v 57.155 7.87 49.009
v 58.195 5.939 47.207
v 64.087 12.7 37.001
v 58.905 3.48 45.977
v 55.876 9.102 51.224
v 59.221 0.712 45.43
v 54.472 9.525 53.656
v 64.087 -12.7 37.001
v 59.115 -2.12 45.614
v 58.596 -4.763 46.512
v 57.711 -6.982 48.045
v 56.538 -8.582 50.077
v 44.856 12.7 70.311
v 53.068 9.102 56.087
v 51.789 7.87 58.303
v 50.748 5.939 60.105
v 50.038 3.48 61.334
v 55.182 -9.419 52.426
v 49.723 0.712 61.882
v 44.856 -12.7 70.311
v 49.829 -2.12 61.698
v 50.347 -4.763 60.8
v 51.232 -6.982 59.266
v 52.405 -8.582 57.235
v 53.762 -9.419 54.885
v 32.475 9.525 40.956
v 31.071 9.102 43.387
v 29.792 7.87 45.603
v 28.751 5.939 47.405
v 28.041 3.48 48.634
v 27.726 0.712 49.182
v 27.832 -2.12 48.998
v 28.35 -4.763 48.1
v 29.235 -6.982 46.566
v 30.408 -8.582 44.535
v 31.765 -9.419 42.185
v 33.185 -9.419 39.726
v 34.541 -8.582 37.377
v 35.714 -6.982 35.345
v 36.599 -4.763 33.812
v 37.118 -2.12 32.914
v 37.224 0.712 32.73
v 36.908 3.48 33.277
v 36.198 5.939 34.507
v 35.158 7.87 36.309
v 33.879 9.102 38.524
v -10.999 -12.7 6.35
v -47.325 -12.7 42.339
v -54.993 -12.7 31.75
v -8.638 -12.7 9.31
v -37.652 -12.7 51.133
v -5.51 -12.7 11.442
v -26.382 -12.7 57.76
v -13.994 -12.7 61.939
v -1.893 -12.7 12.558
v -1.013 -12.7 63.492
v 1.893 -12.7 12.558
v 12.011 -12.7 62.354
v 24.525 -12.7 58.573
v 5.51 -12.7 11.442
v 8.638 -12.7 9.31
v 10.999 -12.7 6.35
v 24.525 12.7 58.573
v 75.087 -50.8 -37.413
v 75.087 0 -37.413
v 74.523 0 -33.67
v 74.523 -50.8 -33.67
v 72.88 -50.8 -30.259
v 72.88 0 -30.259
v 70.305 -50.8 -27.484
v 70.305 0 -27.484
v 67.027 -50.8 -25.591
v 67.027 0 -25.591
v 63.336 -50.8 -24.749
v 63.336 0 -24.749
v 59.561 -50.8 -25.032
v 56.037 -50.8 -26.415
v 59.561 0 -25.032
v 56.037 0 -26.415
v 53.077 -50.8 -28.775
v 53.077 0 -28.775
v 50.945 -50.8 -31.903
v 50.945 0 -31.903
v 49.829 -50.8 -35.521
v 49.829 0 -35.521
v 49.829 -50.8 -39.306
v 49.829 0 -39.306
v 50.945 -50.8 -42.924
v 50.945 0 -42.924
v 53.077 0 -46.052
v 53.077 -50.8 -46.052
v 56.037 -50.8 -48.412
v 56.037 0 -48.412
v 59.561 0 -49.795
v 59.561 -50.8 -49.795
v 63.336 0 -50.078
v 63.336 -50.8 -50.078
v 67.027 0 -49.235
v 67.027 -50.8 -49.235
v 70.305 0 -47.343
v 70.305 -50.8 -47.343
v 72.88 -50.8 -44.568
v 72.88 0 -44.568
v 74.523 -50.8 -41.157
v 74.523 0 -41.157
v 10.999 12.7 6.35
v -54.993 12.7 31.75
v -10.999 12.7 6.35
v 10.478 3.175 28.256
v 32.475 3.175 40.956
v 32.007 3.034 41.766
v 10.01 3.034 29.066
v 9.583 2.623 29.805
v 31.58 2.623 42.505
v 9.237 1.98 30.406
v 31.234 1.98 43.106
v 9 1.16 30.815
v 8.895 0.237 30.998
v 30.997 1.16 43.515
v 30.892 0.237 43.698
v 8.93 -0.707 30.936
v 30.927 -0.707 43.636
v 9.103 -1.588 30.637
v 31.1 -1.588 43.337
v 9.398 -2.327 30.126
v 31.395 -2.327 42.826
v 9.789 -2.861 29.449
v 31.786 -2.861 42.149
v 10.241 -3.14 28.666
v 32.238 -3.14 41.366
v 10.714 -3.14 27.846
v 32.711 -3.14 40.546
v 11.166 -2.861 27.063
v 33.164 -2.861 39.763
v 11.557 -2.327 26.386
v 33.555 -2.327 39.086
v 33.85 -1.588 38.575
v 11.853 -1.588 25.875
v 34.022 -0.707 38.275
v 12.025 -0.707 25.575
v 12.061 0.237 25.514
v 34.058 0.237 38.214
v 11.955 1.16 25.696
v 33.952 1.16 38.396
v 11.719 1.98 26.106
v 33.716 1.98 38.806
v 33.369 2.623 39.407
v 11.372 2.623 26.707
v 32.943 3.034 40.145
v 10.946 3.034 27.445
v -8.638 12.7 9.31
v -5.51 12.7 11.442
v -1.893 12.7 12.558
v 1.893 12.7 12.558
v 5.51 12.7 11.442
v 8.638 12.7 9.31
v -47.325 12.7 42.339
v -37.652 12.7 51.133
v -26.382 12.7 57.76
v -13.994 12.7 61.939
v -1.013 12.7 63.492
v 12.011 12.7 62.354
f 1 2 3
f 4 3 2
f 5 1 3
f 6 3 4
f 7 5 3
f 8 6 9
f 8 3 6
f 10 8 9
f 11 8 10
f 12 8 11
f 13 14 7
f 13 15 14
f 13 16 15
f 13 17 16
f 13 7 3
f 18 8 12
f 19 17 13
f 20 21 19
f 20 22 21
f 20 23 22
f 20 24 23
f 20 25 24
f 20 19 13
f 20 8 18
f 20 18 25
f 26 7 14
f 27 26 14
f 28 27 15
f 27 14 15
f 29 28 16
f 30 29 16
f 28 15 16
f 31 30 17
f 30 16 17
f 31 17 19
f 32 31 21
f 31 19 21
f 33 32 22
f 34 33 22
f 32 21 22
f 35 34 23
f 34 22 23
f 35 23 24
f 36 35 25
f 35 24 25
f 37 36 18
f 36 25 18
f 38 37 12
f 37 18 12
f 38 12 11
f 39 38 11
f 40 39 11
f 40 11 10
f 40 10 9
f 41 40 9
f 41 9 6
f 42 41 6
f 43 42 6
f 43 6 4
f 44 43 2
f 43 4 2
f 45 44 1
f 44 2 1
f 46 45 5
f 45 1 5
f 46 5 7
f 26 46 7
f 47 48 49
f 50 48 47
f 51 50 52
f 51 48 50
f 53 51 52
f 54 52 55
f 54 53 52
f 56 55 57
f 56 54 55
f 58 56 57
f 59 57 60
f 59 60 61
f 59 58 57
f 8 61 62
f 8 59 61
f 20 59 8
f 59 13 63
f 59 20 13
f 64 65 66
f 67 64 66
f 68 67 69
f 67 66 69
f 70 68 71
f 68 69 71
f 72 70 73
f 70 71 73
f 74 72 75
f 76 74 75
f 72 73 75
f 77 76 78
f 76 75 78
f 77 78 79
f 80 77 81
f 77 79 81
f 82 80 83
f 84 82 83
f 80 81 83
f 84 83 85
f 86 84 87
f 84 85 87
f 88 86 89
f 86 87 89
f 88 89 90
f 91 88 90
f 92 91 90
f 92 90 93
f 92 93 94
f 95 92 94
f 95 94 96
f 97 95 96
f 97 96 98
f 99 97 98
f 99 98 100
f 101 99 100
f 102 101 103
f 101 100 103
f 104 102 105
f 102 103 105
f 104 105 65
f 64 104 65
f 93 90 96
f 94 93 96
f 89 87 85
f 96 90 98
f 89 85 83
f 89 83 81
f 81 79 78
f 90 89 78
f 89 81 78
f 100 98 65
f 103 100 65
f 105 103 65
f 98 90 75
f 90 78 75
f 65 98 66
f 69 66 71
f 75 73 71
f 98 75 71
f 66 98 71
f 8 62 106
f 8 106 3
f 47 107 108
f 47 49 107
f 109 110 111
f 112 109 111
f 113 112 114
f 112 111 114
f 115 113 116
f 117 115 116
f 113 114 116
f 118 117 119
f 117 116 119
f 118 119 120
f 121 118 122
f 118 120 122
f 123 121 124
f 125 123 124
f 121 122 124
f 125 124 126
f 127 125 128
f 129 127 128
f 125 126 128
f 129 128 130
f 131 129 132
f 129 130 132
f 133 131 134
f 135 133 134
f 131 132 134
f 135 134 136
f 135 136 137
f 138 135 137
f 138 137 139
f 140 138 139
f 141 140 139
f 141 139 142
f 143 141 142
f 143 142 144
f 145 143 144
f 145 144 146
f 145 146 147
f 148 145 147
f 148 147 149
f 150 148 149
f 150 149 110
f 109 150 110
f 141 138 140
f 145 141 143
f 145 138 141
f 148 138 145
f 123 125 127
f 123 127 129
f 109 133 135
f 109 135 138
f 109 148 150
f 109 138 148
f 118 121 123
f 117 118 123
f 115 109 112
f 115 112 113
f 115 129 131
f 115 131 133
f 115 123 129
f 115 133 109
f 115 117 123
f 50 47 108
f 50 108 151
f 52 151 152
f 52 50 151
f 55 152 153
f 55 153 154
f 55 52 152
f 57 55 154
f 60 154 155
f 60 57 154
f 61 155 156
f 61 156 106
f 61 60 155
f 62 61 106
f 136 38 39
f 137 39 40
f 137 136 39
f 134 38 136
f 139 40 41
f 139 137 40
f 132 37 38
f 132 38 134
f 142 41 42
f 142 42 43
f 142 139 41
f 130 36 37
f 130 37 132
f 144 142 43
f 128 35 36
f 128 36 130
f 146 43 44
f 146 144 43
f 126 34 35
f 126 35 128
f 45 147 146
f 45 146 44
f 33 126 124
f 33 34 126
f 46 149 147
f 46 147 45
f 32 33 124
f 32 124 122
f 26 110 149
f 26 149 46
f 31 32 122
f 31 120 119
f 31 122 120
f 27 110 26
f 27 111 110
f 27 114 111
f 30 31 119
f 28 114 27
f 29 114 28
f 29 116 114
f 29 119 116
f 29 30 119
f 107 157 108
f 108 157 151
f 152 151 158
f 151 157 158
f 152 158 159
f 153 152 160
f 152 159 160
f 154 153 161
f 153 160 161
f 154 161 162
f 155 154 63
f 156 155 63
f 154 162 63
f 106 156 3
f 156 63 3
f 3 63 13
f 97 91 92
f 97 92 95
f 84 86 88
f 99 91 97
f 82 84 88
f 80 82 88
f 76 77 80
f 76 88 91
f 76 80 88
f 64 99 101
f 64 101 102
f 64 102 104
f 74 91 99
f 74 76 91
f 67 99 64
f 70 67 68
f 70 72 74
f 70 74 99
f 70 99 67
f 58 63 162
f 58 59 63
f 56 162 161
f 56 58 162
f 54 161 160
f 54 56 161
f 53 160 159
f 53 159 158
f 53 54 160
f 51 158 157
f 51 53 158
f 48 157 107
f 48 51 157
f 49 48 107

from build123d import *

# Parameters (mm, degrees)
F1_DEPTH = 12.7
F2_R     = 3.175
F3_DEPTH = 50.8
F2_R_2   = 9.525
F4_DEPTH = 25.4
F5_R     = 12.7
F6_DEPTH = 50.8


with BuildPart() as f1:
    # F0 (on Front) → F1 (new body, symmetric)
    with BuildSketch(Plane.XZ):
        with BuildLine():
            ThreePointArc((-10.9985226281, 6.35), (0, 12.7), (10.9985226281, 6.35))
            Line((10.9985226281, 6.35), (54.9926131403, 31.75))
            ThreePointArc((54.9926131403, 31.75), (41.960002336, 47.6613911249), (24.5253888692, 58.5726497677))
            ThreePointArc((24.5253888692, 58.5726497677), (-20.2959743259, 60.1691235283), (-54.9926131403, 31.75))
            Line((-54.9926131403, 31.75), (-10.9985226281, 6.35))
        make_face()
        with BuildLine():
            ThreePointArc((24.5253888692, 58.5726497677), (41.960002336, 47.6613911249), (54.9926131403, 31.75))
            Line((54.9926131403, 31.75), (64.087460216, 37.0009124074))
            Line((64.087460216, 37.0009124074), (44.8561061004, 70.310594834))
            Line((44.8561061004, 70.310594834), (24.5253888692, 58.5726497677))
        make_face()
    extrude(amount=F1_DEPTH, both=True)

    # F2 (on face) → F3 (cut)
    with BuildSketch(Plane(origin=(64.087460216, 0, 37.0009124074), x_dir=(0, 1, 0), z_dir=(0.8660254038, 0, 0.5))):
        with Locations((0, 19.2313541156)):
            Circle(F2_R)
    extrude(amount=-F3_DEPTH, mode=Mode.SUBTRACT)

    # F2 (on face) → F4 (cut)
    with BuildSketch(Plane(origin=(64.087460216, 0, 37.0009124074), x_dir=(0, 1, 0), z_dir=(0.8660254038, 0, 0.5))):
        with Locations((0, 19.2313541156)):
            Circle(F2_R_2)
        with Locations((0, 19.2313541156)):
            Circle(F2_R, mode=Mode.SUBTRACT)
    extrude(amount=-F4_DEPTH, mode=Mode.SUBTRACT)


with BuildPart() as f6:
    # F5 (on Front) → F6 (new body)
    with BuildSketch(Plane.XZ):
        with Locations((62.3870678246, -37.413392216)):
            Circle(F5_R)
    extrude(amount=F6_DEPTH)


solid = Compound([f1.part, f6.part])
